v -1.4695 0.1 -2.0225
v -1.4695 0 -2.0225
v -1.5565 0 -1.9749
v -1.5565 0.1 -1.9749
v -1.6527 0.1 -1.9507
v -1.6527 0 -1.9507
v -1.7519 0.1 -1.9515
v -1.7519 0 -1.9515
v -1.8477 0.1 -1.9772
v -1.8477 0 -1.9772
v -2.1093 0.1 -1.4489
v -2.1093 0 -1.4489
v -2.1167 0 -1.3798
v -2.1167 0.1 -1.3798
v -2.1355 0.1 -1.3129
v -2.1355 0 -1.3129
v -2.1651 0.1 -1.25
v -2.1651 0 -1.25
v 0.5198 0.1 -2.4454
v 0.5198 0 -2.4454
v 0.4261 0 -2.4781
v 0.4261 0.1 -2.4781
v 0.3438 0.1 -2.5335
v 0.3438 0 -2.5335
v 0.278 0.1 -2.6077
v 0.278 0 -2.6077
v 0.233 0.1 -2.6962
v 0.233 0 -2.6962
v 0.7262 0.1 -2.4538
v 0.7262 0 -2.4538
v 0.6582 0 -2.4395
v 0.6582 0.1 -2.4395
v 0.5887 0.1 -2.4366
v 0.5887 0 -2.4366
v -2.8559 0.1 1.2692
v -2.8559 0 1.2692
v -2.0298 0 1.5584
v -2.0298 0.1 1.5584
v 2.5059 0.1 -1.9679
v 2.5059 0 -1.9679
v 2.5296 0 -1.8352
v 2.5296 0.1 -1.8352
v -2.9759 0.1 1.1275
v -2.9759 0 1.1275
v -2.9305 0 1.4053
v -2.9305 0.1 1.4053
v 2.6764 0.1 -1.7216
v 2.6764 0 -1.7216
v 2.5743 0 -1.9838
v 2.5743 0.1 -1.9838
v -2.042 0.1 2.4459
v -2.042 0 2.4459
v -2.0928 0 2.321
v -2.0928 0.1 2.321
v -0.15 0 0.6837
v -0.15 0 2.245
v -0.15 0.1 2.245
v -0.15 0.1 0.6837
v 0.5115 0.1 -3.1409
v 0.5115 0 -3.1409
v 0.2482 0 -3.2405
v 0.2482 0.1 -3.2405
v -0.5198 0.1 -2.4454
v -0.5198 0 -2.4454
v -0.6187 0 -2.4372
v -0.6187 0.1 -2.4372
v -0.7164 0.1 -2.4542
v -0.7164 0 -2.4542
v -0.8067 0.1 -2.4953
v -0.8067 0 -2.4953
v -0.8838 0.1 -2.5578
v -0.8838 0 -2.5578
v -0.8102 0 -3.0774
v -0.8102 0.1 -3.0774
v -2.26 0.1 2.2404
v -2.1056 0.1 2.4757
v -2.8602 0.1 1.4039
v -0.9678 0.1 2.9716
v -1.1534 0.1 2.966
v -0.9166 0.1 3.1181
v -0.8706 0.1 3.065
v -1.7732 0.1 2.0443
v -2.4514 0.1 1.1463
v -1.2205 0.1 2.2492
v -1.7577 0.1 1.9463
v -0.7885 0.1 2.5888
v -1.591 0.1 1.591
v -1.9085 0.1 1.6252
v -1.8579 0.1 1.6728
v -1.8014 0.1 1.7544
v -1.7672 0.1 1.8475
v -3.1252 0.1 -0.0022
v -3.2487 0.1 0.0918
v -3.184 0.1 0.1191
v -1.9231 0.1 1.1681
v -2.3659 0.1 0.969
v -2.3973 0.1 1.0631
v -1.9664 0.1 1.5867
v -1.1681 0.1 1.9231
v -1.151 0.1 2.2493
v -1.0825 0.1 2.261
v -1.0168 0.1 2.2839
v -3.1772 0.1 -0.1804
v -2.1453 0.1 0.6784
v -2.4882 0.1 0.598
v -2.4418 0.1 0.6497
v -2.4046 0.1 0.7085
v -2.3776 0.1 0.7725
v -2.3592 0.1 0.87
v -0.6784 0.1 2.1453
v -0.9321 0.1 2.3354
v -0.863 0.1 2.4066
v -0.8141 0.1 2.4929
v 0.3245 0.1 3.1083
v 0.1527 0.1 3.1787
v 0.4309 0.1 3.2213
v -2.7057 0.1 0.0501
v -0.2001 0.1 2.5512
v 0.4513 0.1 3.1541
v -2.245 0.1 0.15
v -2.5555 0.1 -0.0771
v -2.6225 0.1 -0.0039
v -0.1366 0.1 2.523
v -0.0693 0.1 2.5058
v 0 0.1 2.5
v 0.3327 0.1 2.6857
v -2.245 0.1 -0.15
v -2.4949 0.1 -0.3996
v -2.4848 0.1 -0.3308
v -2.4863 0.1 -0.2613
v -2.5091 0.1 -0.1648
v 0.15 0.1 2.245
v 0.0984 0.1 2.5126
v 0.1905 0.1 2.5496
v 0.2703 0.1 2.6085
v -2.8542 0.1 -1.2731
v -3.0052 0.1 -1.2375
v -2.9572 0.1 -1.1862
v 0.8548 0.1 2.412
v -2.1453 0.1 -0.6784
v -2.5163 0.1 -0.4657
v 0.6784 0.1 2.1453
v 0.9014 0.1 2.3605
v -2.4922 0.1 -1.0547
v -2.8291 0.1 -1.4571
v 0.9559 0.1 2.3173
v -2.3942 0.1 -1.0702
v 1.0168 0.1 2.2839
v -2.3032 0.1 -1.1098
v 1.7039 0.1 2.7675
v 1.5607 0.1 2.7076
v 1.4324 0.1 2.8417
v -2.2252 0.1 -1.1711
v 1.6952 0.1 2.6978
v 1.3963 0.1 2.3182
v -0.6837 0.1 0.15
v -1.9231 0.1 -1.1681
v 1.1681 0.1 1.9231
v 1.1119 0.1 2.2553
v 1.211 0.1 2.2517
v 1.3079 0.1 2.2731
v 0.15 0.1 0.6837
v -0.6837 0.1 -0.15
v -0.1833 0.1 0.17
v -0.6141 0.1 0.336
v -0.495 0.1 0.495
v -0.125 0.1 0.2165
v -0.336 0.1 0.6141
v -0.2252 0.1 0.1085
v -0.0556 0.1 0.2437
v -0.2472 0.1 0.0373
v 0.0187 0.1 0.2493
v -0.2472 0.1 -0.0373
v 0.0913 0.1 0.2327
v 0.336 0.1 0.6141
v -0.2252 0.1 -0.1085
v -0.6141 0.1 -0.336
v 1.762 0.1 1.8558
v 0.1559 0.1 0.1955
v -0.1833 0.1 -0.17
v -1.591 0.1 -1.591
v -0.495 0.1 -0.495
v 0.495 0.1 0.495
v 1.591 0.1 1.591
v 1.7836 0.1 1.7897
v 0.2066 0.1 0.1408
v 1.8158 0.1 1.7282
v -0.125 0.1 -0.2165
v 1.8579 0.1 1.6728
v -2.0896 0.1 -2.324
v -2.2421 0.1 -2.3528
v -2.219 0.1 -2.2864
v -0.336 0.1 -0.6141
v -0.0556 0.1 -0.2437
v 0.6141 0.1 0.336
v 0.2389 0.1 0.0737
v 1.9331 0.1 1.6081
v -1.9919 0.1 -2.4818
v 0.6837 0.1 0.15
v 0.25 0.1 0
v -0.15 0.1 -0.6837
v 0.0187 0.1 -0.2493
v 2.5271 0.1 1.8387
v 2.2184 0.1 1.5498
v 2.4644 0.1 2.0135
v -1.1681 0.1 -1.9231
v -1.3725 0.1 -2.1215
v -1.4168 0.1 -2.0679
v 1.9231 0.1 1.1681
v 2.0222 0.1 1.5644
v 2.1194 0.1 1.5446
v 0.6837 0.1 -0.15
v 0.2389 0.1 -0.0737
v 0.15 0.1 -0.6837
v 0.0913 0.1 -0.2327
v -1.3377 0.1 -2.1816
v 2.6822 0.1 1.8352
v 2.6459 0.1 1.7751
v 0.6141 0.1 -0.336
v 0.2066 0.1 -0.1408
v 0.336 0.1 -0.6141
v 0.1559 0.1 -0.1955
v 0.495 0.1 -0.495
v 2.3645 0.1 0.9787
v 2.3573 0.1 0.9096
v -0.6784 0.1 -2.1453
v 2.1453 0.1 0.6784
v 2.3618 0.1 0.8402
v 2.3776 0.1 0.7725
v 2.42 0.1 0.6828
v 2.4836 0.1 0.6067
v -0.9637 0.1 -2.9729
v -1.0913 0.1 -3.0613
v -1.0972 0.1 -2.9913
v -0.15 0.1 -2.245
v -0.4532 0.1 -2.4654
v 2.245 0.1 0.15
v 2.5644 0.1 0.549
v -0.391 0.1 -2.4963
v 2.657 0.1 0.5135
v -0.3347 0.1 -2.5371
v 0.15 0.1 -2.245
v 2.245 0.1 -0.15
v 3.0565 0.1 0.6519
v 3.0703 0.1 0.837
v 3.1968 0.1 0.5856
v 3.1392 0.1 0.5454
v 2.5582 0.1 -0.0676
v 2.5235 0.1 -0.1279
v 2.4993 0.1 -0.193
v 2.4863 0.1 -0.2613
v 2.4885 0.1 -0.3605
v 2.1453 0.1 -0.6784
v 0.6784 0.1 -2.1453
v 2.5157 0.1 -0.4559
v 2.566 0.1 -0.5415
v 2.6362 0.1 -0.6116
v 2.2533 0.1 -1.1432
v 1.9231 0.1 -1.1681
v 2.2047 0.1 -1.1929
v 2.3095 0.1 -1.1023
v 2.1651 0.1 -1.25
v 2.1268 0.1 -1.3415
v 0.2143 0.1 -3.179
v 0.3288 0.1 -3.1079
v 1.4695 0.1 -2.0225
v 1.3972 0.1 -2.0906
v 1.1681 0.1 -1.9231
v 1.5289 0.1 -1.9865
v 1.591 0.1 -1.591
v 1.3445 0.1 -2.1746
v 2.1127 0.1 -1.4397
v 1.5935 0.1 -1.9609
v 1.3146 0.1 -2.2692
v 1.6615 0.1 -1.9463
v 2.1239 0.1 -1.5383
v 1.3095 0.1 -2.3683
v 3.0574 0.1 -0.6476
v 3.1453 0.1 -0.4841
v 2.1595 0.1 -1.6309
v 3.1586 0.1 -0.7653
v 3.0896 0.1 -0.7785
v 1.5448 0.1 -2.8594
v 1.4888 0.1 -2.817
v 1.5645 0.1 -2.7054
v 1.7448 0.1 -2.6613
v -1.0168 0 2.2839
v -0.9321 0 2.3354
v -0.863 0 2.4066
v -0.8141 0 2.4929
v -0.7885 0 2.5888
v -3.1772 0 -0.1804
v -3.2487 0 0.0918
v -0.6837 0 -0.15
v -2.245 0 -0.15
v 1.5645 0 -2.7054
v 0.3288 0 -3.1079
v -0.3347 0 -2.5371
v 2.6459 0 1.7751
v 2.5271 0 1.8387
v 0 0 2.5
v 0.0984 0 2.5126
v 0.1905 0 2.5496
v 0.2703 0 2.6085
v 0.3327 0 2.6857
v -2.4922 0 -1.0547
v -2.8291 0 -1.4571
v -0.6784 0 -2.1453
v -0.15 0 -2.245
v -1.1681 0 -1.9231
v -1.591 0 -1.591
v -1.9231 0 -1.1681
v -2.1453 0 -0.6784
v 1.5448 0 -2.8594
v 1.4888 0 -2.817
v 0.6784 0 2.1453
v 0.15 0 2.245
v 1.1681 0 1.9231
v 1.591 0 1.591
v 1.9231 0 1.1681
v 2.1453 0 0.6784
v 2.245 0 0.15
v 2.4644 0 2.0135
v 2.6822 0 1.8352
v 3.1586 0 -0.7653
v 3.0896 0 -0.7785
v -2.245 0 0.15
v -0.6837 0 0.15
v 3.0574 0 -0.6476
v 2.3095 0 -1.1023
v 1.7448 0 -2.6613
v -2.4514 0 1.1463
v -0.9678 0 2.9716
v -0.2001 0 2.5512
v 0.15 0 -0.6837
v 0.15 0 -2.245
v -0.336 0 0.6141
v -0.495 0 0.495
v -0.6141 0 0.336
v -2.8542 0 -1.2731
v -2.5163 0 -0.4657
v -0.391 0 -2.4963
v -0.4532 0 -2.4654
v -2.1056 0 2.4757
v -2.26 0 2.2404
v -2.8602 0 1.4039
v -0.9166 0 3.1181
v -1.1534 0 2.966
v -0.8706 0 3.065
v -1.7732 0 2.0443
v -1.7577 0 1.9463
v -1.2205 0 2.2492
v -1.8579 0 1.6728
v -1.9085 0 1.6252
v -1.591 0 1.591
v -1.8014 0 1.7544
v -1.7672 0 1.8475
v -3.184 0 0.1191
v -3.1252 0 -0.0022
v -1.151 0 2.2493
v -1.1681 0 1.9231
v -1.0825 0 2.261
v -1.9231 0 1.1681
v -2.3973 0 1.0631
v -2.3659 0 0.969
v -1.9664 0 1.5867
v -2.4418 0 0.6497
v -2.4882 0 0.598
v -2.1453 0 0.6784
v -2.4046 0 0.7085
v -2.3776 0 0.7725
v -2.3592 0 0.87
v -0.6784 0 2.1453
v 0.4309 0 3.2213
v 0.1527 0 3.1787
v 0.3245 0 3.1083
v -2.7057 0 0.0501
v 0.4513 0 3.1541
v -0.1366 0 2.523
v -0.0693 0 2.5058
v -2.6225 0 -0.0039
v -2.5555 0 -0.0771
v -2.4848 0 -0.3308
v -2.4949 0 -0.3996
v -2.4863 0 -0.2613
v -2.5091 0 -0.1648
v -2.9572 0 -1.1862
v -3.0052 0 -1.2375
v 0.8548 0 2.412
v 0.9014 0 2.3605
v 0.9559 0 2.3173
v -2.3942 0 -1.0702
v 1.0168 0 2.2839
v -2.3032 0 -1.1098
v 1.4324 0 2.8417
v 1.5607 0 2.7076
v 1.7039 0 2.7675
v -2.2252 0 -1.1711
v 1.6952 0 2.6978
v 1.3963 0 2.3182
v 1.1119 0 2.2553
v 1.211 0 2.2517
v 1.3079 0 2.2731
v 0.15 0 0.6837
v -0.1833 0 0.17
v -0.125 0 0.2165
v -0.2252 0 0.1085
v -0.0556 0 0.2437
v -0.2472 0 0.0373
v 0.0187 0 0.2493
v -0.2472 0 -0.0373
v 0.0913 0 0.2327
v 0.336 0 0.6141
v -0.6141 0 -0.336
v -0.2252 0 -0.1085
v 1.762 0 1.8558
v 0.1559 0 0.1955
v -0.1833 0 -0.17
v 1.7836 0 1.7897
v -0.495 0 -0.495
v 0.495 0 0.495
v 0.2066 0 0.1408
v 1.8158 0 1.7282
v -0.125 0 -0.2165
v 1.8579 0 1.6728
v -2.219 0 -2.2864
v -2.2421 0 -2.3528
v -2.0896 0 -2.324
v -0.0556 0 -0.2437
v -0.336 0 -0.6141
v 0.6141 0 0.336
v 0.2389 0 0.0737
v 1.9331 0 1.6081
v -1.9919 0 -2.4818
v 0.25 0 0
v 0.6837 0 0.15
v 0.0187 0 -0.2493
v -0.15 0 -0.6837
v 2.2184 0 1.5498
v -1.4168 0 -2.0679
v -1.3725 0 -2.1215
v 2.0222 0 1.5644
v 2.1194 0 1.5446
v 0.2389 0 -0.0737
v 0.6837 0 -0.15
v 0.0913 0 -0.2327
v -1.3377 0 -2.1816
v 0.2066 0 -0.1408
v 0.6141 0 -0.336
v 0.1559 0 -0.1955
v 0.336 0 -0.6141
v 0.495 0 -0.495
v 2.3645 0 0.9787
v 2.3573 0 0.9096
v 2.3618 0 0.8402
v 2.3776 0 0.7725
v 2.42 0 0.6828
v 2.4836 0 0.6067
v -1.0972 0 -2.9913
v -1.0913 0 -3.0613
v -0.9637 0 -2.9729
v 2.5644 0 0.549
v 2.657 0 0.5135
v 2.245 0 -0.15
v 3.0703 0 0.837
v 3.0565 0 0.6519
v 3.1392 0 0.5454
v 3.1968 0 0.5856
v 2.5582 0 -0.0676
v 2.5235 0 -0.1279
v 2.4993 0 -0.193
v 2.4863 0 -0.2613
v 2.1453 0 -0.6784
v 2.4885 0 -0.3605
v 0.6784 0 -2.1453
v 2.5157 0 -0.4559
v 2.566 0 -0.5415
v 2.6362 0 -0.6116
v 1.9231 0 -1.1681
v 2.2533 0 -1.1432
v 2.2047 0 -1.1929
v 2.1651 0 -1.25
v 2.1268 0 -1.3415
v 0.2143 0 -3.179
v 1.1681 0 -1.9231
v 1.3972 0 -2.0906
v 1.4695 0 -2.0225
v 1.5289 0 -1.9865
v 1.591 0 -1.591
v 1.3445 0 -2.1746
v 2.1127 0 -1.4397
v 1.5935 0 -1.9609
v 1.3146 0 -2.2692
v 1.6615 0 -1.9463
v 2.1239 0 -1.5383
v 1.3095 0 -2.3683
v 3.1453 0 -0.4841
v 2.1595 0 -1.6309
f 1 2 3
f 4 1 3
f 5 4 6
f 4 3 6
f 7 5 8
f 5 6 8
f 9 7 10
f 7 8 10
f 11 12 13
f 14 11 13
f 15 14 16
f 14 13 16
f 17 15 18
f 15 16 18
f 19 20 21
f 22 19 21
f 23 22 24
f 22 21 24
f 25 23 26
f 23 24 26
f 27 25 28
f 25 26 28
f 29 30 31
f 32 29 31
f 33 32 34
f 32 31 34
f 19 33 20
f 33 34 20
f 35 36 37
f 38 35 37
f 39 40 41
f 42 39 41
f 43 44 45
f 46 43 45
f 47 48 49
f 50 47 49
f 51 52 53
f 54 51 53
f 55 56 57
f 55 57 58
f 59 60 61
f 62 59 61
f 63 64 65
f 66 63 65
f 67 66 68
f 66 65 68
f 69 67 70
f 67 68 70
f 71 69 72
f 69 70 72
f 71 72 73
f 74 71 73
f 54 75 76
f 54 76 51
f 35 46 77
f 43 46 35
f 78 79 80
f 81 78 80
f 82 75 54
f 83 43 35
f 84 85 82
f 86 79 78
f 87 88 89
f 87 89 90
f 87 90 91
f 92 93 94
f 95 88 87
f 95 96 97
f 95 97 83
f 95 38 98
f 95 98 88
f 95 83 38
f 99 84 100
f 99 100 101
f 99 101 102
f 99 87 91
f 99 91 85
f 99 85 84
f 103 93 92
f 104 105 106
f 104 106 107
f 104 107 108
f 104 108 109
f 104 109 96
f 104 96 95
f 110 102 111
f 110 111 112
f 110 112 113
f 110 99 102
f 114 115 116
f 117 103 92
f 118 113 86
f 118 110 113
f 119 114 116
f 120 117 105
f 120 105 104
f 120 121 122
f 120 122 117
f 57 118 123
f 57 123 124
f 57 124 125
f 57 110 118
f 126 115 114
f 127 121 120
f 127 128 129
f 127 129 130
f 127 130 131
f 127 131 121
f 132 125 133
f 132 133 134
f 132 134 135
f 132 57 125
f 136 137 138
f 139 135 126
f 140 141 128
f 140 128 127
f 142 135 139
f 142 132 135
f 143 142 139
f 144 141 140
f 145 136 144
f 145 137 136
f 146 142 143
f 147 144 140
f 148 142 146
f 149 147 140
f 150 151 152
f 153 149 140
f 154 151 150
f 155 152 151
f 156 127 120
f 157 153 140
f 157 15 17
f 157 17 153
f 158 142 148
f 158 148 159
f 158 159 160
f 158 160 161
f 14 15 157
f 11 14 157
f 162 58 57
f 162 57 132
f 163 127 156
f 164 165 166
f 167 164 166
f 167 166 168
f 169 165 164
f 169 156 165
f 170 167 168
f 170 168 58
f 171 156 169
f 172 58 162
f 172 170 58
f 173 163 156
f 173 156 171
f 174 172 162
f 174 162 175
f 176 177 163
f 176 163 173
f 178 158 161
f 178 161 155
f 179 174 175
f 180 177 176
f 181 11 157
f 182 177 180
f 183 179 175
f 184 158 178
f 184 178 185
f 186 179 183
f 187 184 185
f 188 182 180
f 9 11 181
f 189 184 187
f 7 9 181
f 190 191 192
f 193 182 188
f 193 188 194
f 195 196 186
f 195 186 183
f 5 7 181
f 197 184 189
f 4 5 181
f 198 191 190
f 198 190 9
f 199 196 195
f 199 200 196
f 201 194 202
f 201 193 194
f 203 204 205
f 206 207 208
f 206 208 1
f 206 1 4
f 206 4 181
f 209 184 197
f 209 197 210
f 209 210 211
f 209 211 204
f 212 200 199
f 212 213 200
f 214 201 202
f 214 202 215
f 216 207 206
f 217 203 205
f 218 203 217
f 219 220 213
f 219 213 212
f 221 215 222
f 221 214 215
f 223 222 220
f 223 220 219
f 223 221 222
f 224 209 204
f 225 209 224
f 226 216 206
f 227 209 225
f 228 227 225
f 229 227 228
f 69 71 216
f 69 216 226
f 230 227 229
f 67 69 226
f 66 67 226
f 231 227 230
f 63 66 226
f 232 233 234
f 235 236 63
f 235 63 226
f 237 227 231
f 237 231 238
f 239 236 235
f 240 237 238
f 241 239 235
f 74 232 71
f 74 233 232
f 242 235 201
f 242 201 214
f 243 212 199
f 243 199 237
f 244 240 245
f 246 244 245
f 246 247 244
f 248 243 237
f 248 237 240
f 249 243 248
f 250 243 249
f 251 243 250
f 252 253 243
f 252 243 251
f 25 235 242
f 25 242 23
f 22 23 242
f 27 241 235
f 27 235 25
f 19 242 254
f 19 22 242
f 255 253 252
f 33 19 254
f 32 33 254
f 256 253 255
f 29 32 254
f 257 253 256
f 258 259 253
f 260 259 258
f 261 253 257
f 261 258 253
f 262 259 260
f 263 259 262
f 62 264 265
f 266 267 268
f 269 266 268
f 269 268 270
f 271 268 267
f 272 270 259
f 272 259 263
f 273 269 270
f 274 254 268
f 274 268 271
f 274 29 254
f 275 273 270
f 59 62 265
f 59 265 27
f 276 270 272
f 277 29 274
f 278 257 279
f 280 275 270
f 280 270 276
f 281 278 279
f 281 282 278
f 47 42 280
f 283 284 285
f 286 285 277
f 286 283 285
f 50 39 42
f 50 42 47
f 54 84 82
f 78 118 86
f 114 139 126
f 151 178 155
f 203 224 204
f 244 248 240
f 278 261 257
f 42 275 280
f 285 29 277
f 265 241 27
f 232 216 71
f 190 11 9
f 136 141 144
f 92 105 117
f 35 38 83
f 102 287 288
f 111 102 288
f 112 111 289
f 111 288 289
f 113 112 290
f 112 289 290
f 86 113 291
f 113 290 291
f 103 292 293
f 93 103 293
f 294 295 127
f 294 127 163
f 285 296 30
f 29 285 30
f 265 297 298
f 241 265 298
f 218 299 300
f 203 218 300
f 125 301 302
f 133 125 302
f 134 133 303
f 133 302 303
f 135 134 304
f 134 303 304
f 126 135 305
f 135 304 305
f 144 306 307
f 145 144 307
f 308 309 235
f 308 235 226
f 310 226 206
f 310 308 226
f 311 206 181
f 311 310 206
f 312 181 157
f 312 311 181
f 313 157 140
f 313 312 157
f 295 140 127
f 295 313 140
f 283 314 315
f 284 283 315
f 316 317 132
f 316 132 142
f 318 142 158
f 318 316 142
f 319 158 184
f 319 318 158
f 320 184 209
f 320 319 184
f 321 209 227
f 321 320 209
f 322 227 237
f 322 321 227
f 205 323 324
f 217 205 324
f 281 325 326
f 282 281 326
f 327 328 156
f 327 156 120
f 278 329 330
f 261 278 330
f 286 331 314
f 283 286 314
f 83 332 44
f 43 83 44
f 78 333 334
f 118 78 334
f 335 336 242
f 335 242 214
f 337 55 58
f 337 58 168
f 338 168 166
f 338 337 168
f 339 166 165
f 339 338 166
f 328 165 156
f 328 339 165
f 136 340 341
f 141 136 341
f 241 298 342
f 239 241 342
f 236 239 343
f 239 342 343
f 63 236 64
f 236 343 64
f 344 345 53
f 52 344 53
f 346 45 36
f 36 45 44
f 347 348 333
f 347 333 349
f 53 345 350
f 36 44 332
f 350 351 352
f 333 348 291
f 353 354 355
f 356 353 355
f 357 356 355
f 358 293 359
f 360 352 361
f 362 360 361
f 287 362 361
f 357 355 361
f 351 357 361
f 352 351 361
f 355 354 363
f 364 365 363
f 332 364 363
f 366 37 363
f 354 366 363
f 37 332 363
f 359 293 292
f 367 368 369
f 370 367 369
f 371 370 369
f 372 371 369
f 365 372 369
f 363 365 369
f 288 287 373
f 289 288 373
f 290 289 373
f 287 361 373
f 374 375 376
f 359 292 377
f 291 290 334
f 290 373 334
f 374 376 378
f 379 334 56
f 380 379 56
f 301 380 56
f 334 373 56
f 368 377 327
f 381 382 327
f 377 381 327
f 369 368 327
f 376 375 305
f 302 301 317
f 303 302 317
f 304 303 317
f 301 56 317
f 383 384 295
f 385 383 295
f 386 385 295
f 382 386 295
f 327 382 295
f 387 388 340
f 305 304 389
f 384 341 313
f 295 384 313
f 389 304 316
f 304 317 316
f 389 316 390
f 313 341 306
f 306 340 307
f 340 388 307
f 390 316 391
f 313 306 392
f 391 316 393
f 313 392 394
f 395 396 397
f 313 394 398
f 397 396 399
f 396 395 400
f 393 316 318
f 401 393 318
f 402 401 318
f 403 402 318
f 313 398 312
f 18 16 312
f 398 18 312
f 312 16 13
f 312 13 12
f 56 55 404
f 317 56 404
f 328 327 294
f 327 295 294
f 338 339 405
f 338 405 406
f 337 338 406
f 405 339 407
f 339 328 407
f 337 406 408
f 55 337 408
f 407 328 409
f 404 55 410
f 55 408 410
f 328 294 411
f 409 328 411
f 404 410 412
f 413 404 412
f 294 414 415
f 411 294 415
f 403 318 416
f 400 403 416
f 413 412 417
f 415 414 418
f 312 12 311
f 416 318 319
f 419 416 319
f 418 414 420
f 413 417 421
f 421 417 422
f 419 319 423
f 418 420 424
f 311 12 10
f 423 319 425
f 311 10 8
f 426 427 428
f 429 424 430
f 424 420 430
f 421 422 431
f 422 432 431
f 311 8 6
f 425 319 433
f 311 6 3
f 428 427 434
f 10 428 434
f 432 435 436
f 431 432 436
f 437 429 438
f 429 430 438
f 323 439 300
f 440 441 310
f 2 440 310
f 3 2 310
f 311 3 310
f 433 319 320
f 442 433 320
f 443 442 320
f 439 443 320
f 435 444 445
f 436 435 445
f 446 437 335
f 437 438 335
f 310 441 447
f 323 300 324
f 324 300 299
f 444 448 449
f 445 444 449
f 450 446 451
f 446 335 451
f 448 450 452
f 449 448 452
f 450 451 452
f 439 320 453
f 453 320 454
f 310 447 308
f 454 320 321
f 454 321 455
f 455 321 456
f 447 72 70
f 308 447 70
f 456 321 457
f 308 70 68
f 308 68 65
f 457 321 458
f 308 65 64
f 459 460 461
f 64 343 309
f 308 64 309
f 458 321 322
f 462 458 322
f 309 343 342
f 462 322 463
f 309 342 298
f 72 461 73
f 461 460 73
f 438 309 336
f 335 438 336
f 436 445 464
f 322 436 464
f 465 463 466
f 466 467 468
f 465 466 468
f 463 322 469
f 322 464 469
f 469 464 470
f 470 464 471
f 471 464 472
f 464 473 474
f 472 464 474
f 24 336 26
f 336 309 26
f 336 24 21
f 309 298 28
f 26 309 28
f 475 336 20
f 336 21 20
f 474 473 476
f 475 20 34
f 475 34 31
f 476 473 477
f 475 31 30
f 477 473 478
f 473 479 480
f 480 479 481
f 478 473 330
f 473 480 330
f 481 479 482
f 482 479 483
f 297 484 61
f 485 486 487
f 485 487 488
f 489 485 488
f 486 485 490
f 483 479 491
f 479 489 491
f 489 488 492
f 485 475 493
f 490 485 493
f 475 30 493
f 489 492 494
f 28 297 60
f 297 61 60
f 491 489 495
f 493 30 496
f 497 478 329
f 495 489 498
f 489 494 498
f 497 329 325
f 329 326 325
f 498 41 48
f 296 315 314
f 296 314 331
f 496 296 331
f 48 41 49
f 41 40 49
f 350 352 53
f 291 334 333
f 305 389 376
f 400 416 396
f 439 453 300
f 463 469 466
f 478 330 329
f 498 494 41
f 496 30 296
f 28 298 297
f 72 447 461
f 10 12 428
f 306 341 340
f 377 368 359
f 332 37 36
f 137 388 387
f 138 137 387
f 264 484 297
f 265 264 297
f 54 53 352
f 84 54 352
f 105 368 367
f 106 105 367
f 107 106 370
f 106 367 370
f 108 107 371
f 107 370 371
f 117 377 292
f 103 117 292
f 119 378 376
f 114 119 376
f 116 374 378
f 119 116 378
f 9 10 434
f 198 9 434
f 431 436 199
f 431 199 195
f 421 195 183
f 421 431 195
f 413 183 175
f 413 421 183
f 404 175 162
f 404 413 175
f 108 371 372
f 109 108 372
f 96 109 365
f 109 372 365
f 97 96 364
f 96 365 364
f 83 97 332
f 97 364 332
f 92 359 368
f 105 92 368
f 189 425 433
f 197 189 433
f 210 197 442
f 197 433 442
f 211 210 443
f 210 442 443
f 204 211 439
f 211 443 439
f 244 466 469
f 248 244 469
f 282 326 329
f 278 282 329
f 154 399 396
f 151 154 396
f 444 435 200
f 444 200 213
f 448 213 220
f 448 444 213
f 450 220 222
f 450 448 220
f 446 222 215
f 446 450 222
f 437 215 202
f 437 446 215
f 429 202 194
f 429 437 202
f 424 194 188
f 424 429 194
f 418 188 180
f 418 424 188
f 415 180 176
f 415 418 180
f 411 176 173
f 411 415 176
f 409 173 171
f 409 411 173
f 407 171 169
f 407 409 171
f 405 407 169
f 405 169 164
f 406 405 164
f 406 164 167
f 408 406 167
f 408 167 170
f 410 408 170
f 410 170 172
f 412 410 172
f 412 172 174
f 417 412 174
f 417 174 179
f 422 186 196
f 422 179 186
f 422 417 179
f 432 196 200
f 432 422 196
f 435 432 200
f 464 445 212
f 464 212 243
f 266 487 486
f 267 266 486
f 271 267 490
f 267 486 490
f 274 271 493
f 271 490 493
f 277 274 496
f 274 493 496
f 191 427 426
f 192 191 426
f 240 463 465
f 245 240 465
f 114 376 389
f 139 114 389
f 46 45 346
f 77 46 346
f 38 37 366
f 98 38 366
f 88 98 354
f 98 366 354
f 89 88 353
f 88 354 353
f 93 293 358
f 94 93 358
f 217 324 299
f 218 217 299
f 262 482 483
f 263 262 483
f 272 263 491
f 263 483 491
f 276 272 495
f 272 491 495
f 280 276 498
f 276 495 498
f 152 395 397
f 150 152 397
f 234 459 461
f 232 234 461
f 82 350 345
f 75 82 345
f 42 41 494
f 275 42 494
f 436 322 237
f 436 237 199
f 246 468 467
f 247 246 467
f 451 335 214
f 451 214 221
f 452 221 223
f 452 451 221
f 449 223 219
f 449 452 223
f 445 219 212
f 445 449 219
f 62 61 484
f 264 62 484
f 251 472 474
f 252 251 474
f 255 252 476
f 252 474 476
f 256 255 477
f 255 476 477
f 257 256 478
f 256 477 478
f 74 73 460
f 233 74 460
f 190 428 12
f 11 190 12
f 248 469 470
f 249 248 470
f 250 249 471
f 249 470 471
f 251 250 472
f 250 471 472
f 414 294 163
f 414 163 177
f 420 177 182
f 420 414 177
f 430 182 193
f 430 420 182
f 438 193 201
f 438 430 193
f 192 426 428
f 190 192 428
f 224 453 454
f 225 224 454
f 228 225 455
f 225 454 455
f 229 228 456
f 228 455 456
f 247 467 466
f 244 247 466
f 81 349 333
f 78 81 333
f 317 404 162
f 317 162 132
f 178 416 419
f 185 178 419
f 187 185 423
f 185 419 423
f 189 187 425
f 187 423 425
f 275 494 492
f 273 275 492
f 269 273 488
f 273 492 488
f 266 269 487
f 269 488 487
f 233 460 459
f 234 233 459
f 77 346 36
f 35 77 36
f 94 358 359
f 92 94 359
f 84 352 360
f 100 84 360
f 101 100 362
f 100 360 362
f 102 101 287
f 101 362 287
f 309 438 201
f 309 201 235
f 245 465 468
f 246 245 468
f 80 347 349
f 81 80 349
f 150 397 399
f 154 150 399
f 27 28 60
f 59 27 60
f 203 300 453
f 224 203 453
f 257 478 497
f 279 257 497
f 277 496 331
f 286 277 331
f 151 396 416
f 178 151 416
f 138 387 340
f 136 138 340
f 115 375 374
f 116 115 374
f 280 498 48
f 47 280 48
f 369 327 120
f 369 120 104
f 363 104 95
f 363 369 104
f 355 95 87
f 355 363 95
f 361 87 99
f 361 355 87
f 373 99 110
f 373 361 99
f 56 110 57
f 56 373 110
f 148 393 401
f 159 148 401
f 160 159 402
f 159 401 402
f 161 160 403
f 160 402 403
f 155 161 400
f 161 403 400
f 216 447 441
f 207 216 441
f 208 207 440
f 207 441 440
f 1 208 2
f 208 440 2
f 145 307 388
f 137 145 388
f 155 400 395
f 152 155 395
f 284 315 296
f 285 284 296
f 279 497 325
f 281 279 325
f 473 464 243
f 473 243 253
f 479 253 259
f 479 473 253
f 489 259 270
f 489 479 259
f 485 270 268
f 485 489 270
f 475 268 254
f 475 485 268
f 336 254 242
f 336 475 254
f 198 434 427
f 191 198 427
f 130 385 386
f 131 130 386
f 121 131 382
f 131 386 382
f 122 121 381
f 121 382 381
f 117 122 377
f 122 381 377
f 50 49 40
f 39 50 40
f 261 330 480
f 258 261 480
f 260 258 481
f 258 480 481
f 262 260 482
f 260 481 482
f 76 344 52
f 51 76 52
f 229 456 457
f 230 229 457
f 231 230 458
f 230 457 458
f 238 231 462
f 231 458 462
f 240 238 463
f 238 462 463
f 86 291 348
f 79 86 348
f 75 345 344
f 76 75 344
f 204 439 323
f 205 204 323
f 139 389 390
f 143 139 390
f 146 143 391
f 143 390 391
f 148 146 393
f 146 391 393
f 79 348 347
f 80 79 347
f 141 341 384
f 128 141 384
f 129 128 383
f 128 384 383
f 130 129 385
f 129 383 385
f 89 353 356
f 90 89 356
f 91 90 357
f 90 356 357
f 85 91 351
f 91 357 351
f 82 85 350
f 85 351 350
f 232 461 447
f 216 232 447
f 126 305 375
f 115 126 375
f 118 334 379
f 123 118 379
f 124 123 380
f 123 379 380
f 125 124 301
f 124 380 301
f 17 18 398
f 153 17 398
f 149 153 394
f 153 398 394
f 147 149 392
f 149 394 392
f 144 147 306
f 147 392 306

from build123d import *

# Parameters (mm, degrees)
BOSS_EXTRUDE1_DEPTH = 0.1
CUT_EXTRUDE1_REACH  = 2.1
SKETCH2_R           = 0.25


with BuildPart() as part:
    # Sketch1 → Boss-Extrude1 (new body)
    with BuildSketch(Plane(origin=(0, 0, 0), x_dir=(1, 0, 0), z_dir=(0, 1, 0))):
        with BuildLine():
            Line((-2.092809674, -2.32103661), (-1.220498963, -2.249243791))
            ThreePointArc((-1.220498963, -2.249243791), (-1.116490826, -2.253732669), (-1.016841608, -2.283863644))
            ThreePointArc((-1.016841608, -2.283863644), (-0.862981663, -2.406617422), (-0.788457807, -2.588791976))
            Line((-0.788457807, -2.588791976), (-1.153371274, -2.965953428))
            Line((-1.153371274, -2.965953428), (-0.91655705, -3.118080046))
            Line((-0.91655705, -3.118080046), (-0.870591181, -3.064950132))
            Line((-0.870591181, -3.064950132), (-0.967826132, -2.971594834))
            Line((-0.967826132, -2.971594834), (-0.200131415, -2.551208099))
            ThreePointArc((-0.200131415, -2.551208099), (-0.103289463, -2.513004973), (0, -2.5))
            ThreePointArc((0, -2.5), (0.190486514, -2.549560679), (0.332664509, -2.685673832))
            Line((0.332664509, -2.685673832), (0.152704852, -3.178651642))
            Line((0.152704852, -3.178651642), (0.430920881, -3.2213052))
            Line((0.430920881, -3.2213052), (0.451302909, -3.154072605))
            Line((0.451302909, -3.154072605), (0.324503341, -3.108337314))
            Line((0.324503341, -3.108337314), (0.854840673, -2.41204535))
            ThreePointArc((0.854840673, -2.41204535), (0.927771587, -2.337755888), (1.016841608, -2.283863644))
            ThreePointArc((1.016841608, -2.283863644), (1.211017841, -2.251661732), (1.39626611, -2.318178284))
            Line((1.39626611, -2.318178284), (1.432376923, -2.84173211))
            Line((1.432376923, -2.84173211), (1.703888677, -2.767537421))
            Line((1.703888677, -2.767537421), (1.695162626, -2.697827272))
            Line((1.695162626, -2.697827272), (1.560723238, -2.707620035))
            Line((1.560723238, -2.707620035), (1.762003043, -1.855818048))
            ThreePointArc((1.762003043, -1.855818048), (1.798412501, -1.758287571), (1.857862064, -1.672826516))
            ThreePointArc((1.857862064, -1.672826516), (2.022153182, -1.564430016), (2.218440616, -1.549848651))
            Line((2.218440616, -1.549848651), (2.46437801, -2.01345128))
            Line((2.46437801, -2.01345128), (2.682238641, -1.835237279))
            Line((2.682238641, -1.835237279), (2.645913325, -1.775103093))
            Line((2.645913325, -1.775103093), (2.527079908, -1.838730653))
            Line((2.527079908, -1.838730653), (2.364499079, -0.978702945))
            ThreePointArc((2.364499079, -0.978702945), (2.358091556, -0.87479536), (2.377641291, -0.772542486))
            ThreePointArc((2.377641291, -0.772542486), (2.483639867, -0.606694138), (2.657026585, -0.513536106))
            Line((2.657026585, -0.513536106), (3.070265752, -0.837026432))
            Line((3.070265752, -0.837026432), (3.196805177, -0.585607939))
            Line((3.196805177, -0.585607939), (3.139161573, -0.545447464))
            Line((3.139161573, -0.545447464), (3.056481505, -0.651908037))
            Line((3.056481505, -0.651908037), (2.558151744, 0.067638788))
            ThreePointArc((2.558151744, 0.067638788), (2.510035158, 0.159956916), (2.486304738, 0.261321158))
            ThreePointArc((2.486304738, 0.261321158), (2.515682656, 0.455944668), (2.63618852, 0.611571497))
            Line((2.63618852, 0.611571497), (3.145276652, 0.484127891))
            Line((3.145276652, 0.484127891), (3.158615056, 0.765278334))
            Line((3.158615056, 0.765278334), (3.089620266, 0.778520987))
            Line((3.089620266, 0.778520987), (3.057389682, 0.6476354))
            Line((3.057389682, 0.6476354), (2.309476732, 1.102285161))
            ThreePointArc((2.309476732, 1.102285161), (2.227970878, 1.167051188), (2.165063509, 1.25))
            ThreePointArc((2.165063509, 1.25), (2.11274106, 1.4397465), (2.15952951, 1.630932832))
            Line((2.15952951, 1.630932832), (2.676440646, 1.721572103))
            Line((2.676440646, 1.721572103), (2.574271696, 1.98384103))
            Line((2.574271696, 1.98384103), (2.505855547, 1.967876087))
            Line((2.505855547, 1.967876087), (2.529647407, 1.835196794))
            Line((2.529647407, 1.835196794), (1.661472212, 1.946336415))
            ThreePointArc((1.661472212, 1.946336415), (1.560670193, 1.972351707), (1.469463131, 2.022542486))
            ThreePointArc((1.469463131, 2.022542486), (1.34448734, 2.174603081), (1.309468229, 2.368291064))
            Line((1.309468229, 2.368291064), (1.744823737, 2.661340858))
            Line((1.744823737, 2.661340858), (1.544813374, 2.85937959))
            Line((1.544813374, 2.85937959), (1.488805639, 2.816967533))
            Line((1.488805639, 2.816967533), (1.564506115, 2.705435989))
            Line((1.564506115, 2.705435989), (0.726184053, 2.453848421))
            ThreePointArc((0.726184053, 2.453848421), (0.623515453, 2.436614698), (0.519779227, 2.445369002))
            ThreePointArc((0.519779227, 2.445369002), (0.343759545, 2.533451034), (0.232987996, 2.696150256))
            Line((0.232987996, 2.696150256), (0.511510953, 3.140939602))
            Line((0.511510953, 3.140939602), (0.248242785, 3.240505442))
            Line((0.248242785, 3.240505442), (0.214327711, 3.178979702))
            Line((0.214327711, 3.178979702), (0.328847502, 3.107880724))
            Line((0.328847502, 3.107880724), (-0.334667927, 2.537067742))
            ThreePointArc((-0.334667927, 2.537067742), (-0.421450773, 2.479564872), (-0.519779227, 2.445369002))
            ThreePointArc((-0.519779227, 2.445369002), (-0.716407398, 2.454242288), (-0.883777979, 2.557820574))
            Line((-0.883777979, 2.557820574), (-0.810246722, 3.077441353))
            Line((-0.810246722, 3.077441353), (-1.091251237, 3.061318464))
            Line((-1.091251237, 3.061318464), (-1.097209426, 2.991317401))
            Line((-1.097209426, 2.991317401), (-0.963671831, 2.972944648))
            Line((-0.963671831, 2.972944648), (-1.337652781, 2.181605003))
            ThreePointArc((-1.337652781, 2.181605003), (-1.393544331, 2.093775753), (-1.469463131, 2.022542486))
            ThreePointArc((-1.469463131, 2.022542486), (-1.652700994, 1.950672754), (-1.847730712, 1.977220479))
            Line((-1.847730712, 1.977220479), (-1.991905378, 2.481825538))
            Line((-1.991905378, 2.481825538), (-2.242058006, 2.352801712))
            Line((-2.242058006, 2.352801712), (-2.219029085, 2.286429145))
            Line((-2.219029085, 2.286429145), (-2.08956355, 2.323959433))
            Line((-2.08956355, 2.323959433), (-2.109345317, 1.448922939))
            ThreePointArc((-2.109345317, 1.448922939), (-2.124681415, 1.345953785), (-2.165063509, 1.25))
            ThreePointArc((-2.165063509, 1.25), (-2.303227573, 1.10981418), (-2.492194019, 1.054741))
            Line((-2.492194019, 1.054741), (-2.829145498, 1.45707954))
            Line((-2.829145498, 1.45707954), (-3.005192577, 1.23746417))
            Line((-3.005192577, 1.23746417), (-2.957158456, 1.186196519))
            Line((-2.957158456, 1.186196519), (-2.854150748, 1.27314052))
            Line((-2.854150748, 1.27314052), (-2.516312885, 0.465708936))
            ThreePointArc((-2.516312885, 0.465708936), (-2.48844178, 0.36540418), (-2.486304738, 0.261321158))
            ThreePointArc((-2.486304738, 0.261321158), (-2.555505181, 0.077058651), (-2.70573434, -0.05011278))
            Line((-2.70573434, -0.05011278), (-3.17720066, 0.180391252))
            Line((-3.17720066, 0.180391252), (-3.248702051, -0.091842169))
            Line((-3.248702051, -0.091842169), (-3.183968265, -0.119140262))
            Line((-3.183968265, -0.119140262), (-3.125229353, 0.002184045))
            Line((-3.125229353, 0.002184045), (-2.488187096, -0.598030373))
            ThreePointArc((-2.488187096, -0.598030373), (-2.421927955, -0.678327127), (-2.377641291, -0.772542486))
            ThreePointArc((-2.377641291, -0.772542486), (-2.365912728, -0.969021018), (-2.451428612, -1.146301605))
            Line((-2.451428612, -1.146301605), (-2.975888963, -1.127488322))
            Line((-2.975888963, -1.127488322), (-2.930481426, -1.405268163))
            Line((-2.930481426, -1.405268163), (-2.860241036, -1.403876609))
            Line((-2.860241036, -1.403876609), (-2.85592741, -1.269150071))
            Line((-2.85592741, -1.269150071), (-2.029831153, -1.558364797))
            ThreePointArc((-2.029831153, -1.558364797), (-1.936640783, -1.604769512), (-1.857862064, -1.672826516))
            ThreePointArc((-1.857862064, -1.672826516), (-1.767232469, -1.84754815), (-1.773248606, -2.044284468))
            Line((-1.773248606, -2.044284468), (-2.26001903, -2.240414922))
            Line((-2.26001903, -2.240414922), (-2.105553941, -2.475710525))
            Line((-2.105553941, -2.475710525), (-2.041952147, -2.445869936))
            Line((-2.041952147, -2.445869936), (-2.092809674, -2.32103661))
        make_face()
    extrude(amount=BOSS_EXTRUDE1_DEPTH)

    # Sketch2 → Cut-Extrude1 (cut, up to next)
    with BuildSketch(Plane(origin=(0, 0, 0), x_dir=(1, 0, 0), z_dir=(0, 1, 0)), mode=Mode.PRIVATE) as cut_extrude1_sk1:
        Circle(SKETCH2_R)
    cut_extrude1_tool1 = extrude(cut_extrude1_sk1.sketch, amount=CUT_EXTRUDE1_REACH, mode=Mode.PRIVATE) & part.part
    add(cut_extrude1_tool1.solids().sort_by_distance((0, 0, 0))[0], mode=Mode.SUBTRACT)
    # Sketch2 → Cut-Extrude1 (cut, up to next)
    with BuildSketch(Plane(origin=(0, 0, 0), x_dir=(1, 0, 0), z_dir=(0, 1, 0)), mode=Mode.PRIVATE) as cut_extrude1_sk2:
        with BuildLine():
            Line((0.15, 2.244994432), (0.15, 0.683739717))
            ThreePointArc((0.15, 0.683739717), (0.494974747, 0.494974747), (0.683739717, 0.15))
            Line((0.683739717, 0.15), (2.244994432, 0.15))
            ThreePointArc((2.244994432, 0.15), (1.590990258, 1.590990258), (0.15, 2.244994432))
        make_face()
    cut_extrude1_tool2 = extrude(cut_extrude1_sk2.sketch, amount=CUT_EXTRUDE1_REACH, mode=Mode.PRIVATE) & part.part
    add(cut_extrude1_tool2.solids().sort_by_distance((1.063034, 0, -1.063034))[0], mode=Mode.SUBTRACT)
    # Sketch2 → Cut-Extrude1 (cut, up to next)
    with BuildSketch(Plane(origin=(0, 0, 0), x_dir=(1, 0, 0), z_dir=(0, 1, 0)), mode=Mode.PRIVATE) as cut_extrude1_sk3:
        with BuildLine():
            Line((-0.15, -2.244994432), (-0.15, -0.683739717))
            ThreePointArc((-0.15, -0.683739717), (-0.494974747, -0.494974747), (-0.683739717, -0.15))
            Line((-0.683739717, -0.15), (-2.244994432, -0.15))
            ThreePointArc((-2.244994432, -0.15), (-1.590990258, -1.590990258), (-0.15, -2.244994432))
        make_face()
    cut_extrude1_tool3 = extrude(cut_extrude1_sk3.sketch, amount=CUT_EXTRUDE1_REACH, mode=Mode.PRIVATE) & part.part
    add(cut_extrude1_tool3.solids().sort_by_distance((-1.063034, 0, 1.063034))[0], mode=Mode.SUBTRACT)
    # Sketch2 → Cut-Extrude1 (cut, up to next)
    with BuildSketch(Plane(origin=(0, 0, 0), x_dir=(1, 0, 0), z_dir=(0, 1, 0)), mode=Mode.PRIVATE) as cut_extrude1_sk4:
        with BuildLine():
            Line((-2.244994432, 0.15), (-0.683739717, 0.15))
            ThreePointArc((-0.683739717, 0.15), (-0.494974747, 0.494974747), (-0.15, 0.683739717))
            Line((-0.15, 0.683739717), (-0.15, 2.244994432))
            ThreePointArc((-0.15, 2.244994432), (-1.590990258, 1.590990258), (-2.244994432, 0.15))
        make_face()
    cut_extrude1_tool4 = extrude(cut_extrude1_sk4.sketch, amount=CUT_EXTRUDE1_REACH, mode=Mode.PRIVATE) & part.part
    add(cut_extrude1_tool4.solids().sort_by_distance((-1.063034, 0, -1.063034))[0], mode=Mode.SUBTRACT)
    # Sketch2 → Cut-Extrude1 (cut, up to next)
    with BuildSketch(Plane(origin=(0, 0, 0), x_dir=(1, 0, 0), z_dir=(0, 1, 0)), mode=Mode.PRIVATE) as cut_extrude1_sk5:
        with BuildLine():
            Line((0.15, -0.683739717), (0.15, -2.244994432))
            ThreePointArc((0.15, -2.244994432), (1.590990258, -1.590990258), (2.244994432, -0.15))
            Line((2.244994432, -0.15), (0.683739717, -0.15))
            ThreePointArc((0.683739717, -0.15), (0.494974747, -0.494974747), (0.15, -0.683739717))
        make_face()
    cut_extrude1_tool5 = extrude(cut_extrude1_sk5.sketch, amount=CUT_EXTRUDE1_REACH, mode=Mode.PRIVATE) & part.part
    add(cut_extrude1_tool5.solids().sort_by_distance((1.063034, 0, 1.063034))[0], mode=Mode.SUBTRACT)


solid = part.part
